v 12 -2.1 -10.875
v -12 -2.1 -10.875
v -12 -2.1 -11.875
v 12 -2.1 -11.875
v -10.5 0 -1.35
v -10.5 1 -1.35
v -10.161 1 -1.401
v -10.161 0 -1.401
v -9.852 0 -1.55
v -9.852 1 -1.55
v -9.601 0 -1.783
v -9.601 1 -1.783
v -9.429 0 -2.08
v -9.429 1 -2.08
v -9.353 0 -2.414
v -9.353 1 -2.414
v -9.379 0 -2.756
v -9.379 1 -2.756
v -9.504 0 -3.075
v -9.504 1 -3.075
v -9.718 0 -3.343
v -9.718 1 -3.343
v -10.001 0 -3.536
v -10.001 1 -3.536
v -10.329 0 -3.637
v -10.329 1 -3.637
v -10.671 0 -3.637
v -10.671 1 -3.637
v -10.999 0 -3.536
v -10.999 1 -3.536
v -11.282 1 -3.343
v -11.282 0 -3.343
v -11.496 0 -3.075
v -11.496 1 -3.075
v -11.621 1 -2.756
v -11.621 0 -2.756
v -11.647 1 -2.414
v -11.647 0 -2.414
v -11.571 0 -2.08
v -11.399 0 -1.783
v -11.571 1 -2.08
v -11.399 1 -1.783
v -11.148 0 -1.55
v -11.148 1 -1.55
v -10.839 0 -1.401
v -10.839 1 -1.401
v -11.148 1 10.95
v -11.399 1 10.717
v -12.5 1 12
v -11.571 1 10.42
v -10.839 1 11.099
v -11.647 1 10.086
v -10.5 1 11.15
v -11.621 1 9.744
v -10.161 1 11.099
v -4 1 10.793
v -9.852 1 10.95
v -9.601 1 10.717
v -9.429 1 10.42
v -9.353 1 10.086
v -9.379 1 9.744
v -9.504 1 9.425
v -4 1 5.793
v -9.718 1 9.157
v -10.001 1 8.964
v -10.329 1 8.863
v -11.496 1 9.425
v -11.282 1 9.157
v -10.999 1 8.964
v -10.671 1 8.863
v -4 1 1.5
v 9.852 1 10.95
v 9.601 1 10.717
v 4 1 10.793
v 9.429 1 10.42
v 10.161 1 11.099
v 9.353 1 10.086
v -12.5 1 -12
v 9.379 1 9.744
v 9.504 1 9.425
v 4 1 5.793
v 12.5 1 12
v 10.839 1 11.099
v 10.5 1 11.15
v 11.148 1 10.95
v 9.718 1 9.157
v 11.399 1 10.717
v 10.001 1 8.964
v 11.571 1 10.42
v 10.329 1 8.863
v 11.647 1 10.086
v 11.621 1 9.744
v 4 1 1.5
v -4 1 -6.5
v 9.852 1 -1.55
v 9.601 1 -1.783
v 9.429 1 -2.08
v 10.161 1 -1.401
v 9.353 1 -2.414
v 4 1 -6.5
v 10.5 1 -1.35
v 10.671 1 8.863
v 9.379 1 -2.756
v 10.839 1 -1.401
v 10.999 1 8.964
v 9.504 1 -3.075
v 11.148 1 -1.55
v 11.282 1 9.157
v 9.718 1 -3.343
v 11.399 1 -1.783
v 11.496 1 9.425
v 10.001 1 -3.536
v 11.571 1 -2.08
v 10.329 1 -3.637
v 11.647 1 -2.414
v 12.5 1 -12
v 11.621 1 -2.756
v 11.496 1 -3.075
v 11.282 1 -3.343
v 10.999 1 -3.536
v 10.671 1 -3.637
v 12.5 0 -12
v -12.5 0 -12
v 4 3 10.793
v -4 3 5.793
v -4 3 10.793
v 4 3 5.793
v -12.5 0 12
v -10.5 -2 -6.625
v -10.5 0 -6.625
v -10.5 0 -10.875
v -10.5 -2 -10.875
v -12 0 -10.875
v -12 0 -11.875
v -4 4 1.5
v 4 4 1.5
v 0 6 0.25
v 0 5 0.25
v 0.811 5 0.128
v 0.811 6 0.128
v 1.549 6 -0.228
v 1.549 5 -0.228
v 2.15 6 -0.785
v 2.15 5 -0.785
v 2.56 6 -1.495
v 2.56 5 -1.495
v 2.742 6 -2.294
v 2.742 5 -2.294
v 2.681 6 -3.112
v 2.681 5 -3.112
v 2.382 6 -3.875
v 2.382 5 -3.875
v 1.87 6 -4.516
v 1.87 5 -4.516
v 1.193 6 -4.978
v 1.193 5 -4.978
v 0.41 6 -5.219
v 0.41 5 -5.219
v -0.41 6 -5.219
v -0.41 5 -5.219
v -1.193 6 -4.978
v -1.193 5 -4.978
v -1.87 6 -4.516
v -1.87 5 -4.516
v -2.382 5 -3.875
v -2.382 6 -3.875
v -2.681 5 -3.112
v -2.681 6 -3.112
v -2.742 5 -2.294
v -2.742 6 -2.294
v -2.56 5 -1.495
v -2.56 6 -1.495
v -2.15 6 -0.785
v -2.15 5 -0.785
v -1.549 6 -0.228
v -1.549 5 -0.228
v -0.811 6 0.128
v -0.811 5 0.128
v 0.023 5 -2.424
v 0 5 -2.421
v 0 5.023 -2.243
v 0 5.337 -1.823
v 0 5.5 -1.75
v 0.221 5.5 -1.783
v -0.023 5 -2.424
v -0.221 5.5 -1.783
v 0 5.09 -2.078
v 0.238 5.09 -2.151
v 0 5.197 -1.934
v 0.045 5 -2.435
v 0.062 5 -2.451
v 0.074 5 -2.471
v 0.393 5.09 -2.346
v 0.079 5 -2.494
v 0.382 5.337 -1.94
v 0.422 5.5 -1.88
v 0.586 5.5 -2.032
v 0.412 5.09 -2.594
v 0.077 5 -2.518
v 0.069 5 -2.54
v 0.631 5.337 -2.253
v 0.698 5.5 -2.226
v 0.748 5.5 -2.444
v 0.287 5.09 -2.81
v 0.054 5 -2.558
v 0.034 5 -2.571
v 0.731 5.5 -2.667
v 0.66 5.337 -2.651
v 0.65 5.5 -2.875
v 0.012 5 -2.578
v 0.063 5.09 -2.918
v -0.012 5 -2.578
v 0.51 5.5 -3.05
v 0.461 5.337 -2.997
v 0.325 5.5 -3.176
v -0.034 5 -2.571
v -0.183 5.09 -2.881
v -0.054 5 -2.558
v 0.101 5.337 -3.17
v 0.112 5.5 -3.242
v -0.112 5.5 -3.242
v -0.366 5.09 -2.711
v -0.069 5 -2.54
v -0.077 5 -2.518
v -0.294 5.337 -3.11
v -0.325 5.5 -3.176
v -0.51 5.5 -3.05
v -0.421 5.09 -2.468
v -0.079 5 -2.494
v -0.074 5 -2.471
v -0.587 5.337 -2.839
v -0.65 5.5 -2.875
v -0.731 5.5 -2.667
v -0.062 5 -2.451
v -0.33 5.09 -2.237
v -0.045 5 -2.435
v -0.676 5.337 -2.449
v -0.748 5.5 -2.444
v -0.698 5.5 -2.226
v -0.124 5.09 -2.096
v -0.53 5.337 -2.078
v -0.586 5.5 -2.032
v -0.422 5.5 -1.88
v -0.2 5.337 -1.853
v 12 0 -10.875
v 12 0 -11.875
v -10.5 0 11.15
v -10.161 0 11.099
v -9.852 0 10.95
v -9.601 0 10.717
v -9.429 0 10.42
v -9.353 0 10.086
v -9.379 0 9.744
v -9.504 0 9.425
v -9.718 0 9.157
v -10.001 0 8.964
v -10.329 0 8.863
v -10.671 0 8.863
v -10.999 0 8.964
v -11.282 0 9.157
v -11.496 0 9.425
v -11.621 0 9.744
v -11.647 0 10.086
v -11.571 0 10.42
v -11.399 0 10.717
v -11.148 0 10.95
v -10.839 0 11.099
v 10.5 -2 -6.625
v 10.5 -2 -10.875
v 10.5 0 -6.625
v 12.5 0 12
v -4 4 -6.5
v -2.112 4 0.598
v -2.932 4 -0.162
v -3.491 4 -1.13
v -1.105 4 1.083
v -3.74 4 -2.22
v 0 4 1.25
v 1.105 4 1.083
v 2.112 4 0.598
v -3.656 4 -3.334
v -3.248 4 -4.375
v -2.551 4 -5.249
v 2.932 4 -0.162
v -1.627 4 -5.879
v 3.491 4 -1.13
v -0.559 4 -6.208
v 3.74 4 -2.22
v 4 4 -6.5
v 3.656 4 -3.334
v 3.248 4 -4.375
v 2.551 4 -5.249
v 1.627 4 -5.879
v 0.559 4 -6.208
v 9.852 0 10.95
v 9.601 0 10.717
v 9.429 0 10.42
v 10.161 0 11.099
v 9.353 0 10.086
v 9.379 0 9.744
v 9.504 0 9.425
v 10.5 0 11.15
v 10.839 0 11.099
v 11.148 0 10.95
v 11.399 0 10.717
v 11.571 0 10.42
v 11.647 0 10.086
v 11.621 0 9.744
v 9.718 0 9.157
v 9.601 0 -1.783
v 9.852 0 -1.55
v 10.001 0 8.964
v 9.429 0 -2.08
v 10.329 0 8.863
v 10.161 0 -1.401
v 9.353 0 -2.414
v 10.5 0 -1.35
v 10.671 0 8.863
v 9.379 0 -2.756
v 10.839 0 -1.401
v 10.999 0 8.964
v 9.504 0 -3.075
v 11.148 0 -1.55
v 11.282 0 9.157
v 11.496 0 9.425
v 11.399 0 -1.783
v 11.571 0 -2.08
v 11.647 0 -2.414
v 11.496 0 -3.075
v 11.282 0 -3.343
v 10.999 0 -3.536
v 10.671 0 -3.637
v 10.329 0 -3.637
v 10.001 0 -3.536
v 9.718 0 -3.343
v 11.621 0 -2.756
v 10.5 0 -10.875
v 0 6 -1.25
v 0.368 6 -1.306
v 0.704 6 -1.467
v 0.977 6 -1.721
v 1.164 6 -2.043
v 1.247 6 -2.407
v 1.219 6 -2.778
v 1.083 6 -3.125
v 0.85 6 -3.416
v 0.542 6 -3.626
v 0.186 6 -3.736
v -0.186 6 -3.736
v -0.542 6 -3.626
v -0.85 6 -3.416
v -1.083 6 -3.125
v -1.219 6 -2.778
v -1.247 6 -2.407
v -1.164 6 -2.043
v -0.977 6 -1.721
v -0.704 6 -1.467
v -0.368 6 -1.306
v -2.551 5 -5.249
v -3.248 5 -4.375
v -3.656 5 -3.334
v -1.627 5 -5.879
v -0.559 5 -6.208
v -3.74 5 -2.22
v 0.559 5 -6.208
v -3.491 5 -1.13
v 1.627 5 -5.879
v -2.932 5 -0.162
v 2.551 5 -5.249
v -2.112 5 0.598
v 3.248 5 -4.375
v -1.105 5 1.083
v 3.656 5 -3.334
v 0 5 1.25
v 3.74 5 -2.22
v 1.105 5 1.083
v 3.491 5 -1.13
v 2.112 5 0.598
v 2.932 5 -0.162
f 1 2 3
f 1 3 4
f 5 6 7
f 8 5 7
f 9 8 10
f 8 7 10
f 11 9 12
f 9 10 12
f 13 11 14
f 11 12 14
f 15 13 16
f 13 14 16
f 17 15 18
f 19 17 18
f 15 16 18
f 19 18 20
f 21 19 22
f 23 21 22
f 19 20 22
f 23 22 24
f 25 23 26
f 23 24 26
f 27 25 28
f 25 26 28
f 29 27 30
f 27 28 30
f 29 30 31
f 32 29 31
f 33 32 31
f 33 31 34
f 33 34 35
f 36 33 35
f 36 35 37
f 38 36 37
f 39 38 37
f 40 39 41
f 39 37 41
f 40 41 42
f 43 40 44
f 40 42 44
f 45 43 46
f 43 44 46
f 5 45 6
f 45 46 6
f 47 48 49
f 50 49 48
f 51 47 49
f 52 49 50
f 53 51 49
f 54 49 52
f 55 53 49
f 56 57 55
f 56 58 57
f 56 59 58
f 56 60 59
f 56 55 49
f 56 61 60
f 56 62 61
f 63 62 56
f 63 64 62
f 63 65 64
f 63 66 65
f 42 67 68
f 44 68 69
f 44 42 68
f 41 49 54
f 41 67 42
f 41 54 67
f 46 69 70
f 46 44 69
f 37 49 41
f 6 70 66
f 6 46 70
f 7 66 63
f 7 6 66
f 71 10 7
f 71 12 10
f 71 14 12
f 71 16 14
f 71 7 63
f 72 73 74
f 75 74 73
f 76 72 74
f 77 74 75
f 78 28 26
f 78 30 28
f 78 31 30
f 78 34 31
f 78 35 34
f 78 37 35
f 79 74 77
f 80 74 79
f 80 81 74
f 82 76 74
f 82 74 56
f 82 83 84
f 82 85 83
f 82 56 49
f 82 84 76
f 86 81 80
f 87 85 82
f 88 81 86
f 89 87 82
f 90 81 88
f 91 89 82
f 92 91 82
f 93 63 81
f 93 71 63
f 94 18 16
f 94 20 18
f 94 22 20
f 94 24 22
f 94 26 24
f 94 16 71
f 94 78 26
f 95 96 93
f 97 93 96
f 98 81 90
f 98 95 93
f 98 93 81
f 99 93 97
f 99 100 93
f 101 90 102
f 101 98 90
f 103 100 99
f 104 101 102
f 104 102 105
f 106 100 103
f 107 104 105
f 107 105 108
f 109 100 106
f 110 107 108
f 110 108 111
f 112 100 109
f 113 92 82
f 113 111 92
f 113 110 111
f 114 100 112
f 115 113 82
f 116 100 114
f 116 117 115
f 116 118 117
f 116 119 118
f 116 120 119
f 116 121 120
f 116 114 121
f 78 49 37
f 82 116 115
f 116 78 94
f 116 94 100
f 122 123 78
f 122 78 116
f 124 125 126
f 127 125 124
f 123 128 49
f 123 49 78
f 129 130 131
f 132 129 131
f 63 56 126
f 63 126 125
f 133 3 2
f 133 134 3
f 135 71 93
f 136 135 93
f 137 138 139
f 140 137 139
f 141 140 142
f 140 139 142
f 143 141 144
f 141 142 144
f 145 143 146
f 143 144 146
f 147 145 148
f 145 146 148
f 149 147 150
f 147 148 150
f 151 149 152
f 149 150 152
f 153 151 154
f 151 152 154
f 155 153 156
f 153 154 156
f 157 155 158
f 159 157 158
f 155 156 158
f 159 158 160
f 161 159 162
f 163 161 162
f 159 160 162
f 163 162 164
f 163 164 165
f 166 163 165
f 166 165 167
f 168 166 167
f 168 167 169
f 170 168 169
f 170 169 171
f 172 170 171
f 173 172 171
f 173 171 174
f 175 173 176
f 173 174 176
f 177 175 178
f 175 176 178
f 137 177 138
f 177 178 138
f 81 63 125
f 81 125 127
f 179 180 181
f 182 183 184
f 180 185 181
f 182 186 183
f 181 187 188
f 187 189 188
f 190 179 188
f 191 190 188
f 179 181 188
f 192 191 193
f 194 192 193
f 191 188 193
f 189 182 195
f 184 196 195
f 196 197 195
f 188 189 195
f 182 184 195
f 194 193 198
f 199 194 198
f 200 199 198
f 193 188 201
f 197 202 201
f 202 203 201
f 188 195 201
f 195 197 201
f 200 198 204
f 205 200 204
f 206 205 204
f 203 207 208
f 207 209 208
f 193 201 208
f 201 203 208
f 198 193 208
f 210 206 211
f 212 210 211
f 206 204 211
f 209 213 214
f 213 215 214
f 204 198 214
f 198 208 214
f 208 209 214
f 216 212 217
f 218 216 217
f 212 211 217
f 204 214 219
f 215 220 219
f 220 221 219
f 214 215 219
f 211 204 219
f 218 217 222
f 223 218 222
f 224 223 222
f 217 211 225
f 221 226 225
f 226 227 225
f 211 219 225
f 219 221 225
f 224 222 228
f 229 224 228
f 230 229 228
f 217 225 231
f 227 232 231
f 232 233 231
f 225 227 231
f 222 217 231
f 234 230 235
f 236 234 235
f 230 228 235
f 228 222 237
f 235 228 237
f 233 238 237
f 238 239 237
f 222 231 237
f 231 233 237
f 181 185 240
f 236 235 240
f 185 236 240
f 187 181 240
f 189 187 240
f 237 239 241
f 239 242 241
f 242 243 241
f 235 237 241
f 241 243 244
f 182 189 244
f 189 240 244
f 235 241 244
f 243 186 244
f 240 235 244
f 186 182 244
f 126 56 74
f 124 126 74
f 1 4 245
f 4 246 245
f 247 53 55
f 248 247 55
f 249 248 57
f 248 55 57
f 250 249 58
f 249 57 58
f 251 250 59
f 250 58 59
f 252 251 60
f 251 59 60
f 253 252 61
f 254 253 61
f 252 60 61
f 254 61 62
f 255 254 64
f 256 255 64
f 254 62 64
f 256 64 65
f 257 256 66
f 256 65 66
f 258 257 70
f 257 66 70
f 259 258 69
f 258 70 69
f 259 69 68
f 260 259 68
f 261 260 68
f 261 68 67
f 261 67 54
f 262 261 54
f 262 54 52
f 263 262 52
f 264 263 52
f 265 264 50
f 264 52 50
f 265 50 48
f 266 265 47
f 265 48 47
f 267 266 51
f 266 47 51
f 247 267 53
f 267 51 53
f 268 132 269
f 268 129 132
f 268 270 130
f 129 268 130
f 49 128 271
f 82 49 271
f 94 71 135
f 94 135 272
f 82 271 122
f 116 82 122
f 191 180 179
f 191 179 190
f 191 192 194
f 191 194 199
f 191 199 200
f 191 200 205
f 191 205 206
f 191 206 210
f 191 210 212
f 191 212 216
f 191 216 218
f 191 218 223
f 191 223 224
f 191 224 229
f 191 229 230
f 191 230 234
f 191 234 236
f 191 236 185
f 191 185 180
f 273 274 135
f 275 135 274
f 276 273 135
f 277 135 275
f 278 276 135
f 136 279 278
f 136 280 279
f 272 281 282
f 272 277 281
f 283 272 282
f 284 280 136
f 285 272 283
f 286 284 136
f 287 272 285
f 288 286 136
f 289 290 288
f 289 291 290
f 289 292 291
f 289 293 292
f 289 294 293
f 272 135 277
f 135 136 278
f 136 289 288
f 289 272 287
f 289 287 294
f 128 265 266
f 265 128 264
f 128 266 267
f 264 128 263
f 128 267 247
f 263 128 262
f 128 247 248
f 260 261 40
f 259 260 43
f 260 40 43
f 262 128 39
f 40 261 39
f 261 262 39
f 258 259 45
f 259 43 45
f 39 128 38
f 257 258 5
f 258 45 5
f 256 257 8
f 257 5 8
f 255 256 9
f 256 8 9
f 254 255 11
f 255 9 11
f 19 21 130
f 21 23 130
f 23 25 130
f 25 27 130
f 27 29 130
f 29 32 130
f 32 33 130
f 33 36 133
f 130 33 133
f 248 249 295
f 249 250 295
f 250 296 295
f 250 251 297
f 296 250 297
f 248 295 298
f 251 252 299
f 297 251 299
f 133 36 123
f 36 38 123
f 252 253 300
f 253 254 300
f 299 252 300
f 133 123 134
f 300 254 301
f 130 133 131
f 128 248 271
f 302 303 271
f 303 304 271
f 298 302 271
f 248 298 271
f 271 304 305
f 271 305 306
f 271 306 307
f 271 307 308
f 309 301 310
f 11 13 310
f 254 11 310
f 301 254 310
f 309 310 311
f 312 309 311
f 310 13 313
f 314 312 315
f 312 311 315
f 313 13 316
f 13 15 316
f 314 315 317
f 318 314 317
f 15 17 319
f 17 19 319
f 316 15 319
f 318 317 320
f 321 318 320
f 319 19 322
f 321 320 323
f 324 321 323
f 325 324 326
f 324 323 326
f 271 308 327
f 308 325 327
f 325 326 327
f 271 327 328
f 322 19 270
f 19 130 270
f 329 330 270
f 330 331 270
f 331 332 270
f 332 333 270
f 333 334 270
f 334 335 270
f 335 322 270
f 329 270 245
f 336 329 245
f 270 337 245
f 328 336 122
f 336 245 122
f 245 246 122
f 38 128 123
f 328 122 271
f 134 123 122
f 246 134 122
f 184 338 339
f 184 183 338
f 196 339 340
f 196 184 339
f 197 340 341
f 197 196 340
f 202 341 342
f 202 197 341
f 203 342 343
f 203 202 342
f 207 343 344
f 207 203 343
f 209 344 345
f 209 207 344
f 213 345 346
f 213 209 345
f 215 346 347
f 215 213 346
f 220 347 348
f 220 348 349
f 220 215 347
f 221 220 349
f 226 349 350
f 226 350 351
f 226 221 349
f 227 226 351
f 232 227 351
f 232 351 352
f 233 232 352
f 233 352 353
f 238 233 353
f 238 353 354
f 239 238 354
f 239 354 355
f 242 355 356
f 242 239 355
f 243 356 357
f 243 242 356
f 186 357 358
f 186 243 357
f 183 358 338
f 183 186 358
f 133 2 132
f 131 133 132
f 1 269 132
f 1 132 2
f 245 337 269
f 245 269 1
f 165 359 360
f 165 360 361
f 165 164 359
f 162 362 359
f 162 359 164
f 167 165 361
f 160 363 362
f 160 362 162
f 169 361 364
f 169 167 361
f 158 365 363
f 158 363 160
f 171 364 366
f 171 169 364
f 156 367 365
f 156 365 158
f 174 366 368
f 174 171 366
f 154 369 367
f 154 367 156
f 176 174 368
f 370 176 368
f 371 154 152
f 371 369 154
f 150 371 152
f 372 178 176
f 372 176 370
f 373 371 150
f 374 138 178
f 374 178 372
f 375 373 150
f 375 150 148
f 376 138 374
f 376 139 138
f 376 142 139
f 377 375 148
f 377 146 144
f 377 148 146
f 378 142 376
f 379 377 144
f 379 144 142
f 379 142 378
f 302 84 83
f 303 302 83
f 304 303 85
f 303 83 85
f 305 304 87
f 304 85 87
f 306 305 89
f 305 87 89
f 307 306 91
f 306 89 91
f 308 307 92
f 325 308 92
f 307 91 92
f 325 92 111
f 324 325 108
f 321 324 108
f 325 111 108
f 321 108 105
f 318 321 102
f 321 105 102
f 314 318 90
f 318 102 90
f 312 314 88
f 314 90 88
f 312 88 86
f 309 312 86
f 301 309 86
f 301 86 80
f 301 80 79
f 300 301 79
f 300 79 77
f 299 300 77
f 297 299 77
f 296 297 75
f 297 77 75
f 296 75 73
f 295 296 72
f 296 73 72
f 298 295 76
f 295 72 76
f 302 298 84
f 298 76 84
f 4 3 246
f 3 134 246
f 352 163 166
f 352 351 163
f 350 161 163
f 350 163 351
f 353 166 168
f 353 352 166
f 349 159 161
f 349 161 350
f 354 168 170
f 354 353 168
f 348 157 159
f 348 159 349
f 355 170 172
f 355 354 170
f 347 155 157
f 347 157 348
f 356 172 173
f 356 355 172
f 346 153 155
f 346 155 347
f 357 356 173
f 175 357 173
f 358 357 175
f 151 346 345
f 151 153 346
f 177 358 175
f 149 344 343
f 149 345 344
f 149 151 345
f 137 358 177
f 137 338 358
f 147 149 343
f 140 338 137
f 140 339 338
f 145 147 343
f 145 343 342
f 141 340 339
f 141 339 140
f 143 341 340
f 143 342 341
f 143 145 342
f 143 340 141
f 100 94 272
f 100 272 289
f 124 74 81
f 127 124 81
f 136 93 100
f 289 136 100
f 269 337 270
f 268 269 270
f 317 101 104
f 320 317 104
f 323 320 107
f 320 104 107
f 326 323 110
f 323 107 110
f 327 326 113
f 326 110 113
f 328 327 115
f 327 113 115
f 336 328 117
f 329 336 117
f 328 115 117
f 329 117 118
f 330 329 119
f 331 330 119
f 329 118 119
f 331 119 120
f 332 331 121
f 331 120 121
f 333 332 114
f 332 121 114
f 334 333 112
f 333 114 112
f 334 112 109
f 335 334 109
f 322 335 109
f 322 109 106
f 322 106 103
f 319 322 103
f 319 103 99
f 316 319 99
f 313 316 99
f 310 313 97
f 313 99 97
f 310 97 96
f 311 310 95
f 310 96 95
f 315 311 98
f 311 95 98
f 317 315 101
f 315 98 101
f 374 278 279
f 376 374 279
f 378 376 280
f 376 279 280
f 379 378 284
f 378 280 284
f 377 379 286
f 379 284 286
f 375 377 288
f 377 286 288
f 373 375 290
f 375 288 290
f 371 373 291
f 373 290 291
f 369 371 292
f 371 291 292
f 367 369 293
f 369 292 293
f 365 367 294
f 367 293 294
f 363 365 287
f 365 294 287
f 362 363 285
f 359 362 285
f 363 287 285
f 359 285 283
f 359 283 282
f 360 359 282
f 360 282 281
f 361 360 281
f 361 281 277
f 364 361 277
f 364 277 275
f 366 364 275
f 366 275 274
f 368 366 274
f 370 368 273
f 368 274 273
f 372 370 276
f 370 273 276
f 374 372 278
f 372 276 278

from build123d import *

# Parameters (mm, degrees)
SKETCH1_W           = 25
SKETCH1_H           = 24
BOSS_EXTRUDE1_DEPTH = 1
SKETCH2_R           = 1.15
CUT_EXTRUDE1_DEPTH  = 1
SKETCH3_W           = 8
SKETCH3_H           = 5
BOSS_EXTRUDE2_DEPTH = 2
SKETCH4_W           = 8
SKETCH4_H           = 8
BOSS_EXTRUDE3_DEPTH = 3
SKETCH5_R           = 3.75
BOSS_EXTRUDE4_DEPTH = 1
SKETCH6_R           = 2.75
BOSS_EXTRUDE5_DEPTH = 1
SKETCH7_R           = 0.75
CUT_EXTRUDE3_DEPTH  = 1
CHAMFER1_SIZE       = 0.5
FILLET2_R           = 0.7
BOSS_EXTRUDE6_DEPTH = 2
SKETCH9_W           = 24
SKETCH9_H           = 1
BOSS_EXTRUDE7_DEPTH = 0.1


with BuildPart() as part:
    # Sketch1 → Boss-Extrude1 (new body)
    with BuildSketch(Plane(origin=(0, 0, 0), x_dir=(1, 0, 0), z_dir=(0, 1, 0))):
        Rectangle(SKETCH1_W, SKETCH1_H)
    extrude(amount=BOSS_EXTRUDE1_DEPTH)

    # Sketch2 → Cut-Extrude1 (cut)
    with BuildSketch(Plane(origin=(0, 1, 0), x_dir=(1, 0, 0), z_dir=(0, 1, 0))):
        with Locations(Location((10.5, -10, 0), (0, 0, 270))):
            Circle(SKETCH2_R)
        with Locations(Location((-10.5, -10, 0), (0, 0, 270))):
            Circle(SKETCH2_R)
        with Locations(Location((-10.5, 2.5, 0), (0, 0, 270))):
            Circle(SKETCH2_R)
        with Locations(Location((10.5, 2.5, 0), (0, 0, 270))):
            Circle(SKETCH2_R)
    extrude(amount=-CUT_EXTRUDE1_DEPTH, mode=Mode.SUBTRACT)

    # Sketch3 → Boss-Extrude2 (add)
    with BuildSketch(Plane(origin=(0, 1, 0), x_dir=(1, 0, 0), z_dir=(0, 1, 0))):
        with Locations((0, -8.293334271)):
            Rectangle(SKETCH3_W, SKETCH3_H)
    extrude(amount=BOSS_EXTRUDE2_DEPTH)

    # Sketch4 → Boss-Extrude3 (add)
    with BuildSketch(Plane(origin=(0, 1, 0), x_dir=(1, 0, 0), z_dir=(0, 1, 0))):
        with Locations((0, 2.5)):
            Rectangle(SKETCH4_W, SKETCH4_H)
    extrude(amount=BOSS_EXTRUDE3_DEPTH)

    # Sketch5 → Boss-Extrude4 (add)
    with BuildSketch(Plane(origin=(0, 4, 0), x_dir=(1, 0, 0), z_dir=(0, 1, 0))):
        with Locations(Location((0, 2.5, 0), (0, 0, 270))):
            Circle(SKETCH5_R)
    extrude(amount=BOSS_EXTRUDE4_DEPTH)

    # Sketch6 → Boss-Extrude5 (add)
    with BuildSketch(Plane(origin=(0, 5, 0), x_dir=(1, 0, 0), z_dir=(0, 1, 0))):
        with Locations(Location((0, 2.5, 0), (0, 0, 270))):
            Circle(SKETCH6_R)
    extrude(amount=BOSS_EXTRUDE5_DEPTH)

    # Sketch7 → Cut-Extrude3 (cut)
    with BuildSketch(Plane(origin=(0, 6, 0), x_dir=(1, 0, 0), z_dir=(0, 1, 0))):
        with Locations(Location((0, 2.5, 0), (0, 0, 270))):
            Circle(SKETCH7_R)
    extrude(amount=-CUT_EXTRUDE3_DEPTH, mode=Mode.SUBTRACT)

    # Chamfer1
    chamfer1_edges = [part.edges().sort_by_distance(p)[0] for p in [
        (0, 6, -3.25),
    ]]
    chamfer(chamfer1_edges, length=CHAMFER1_SIZE)

    # Fillet2
    # the kernel refuses this fillet: 0.7 mm, written as the material it adds along each edge
    with BuildSketch(Plane(origin=(0, 5, -2.5), x_dir=(0, 0, 1), z_dir=(-1, 0, 0))) as fillet2_piece_1:
        with BuildLine():
            CenterArc((0.079179607, 0.7), FILLET2_R, 270, 73.398450401)
            Line((0.079179607, 0), (0.079179607, -0.014))
            Line((0.079179607, -0.014), (0.75, -0.014))
            Line((0.75, -0.014), (0.764, 0))
            ThreePointArc((0.764, 0), (0.764, 0.25), (0.763416408, 0.496))
            Line((0.763416408, 0.496), (0.75, 0.5))
        make_face()
    revolve(axis=Axis((0, 5, -2.5), (0, 1, 0)))

    # Sketch8 → Boss-Extrude6 (add)
    with BuildSketch(Plane.XZ):
        Polygon((10.5, -11.875), (12, -11.875), (12, -10.875), (10.5, -10.875), (10.5, -6.625), (-10.5, -6.625), (-10.5, -10.875), (-12, -10.875), (-12, -11.875), (-10.5, -11.875), align=None)
    extrude(amount=BOSS_EXTRUDE6_DEPTH)

    # Sketch9 → Boss-Extrude7 (add)
    with BuildSketch(Plane.XZ.offset(2)):
        with Locations((0, -11.375)):
            Rectangle(SKETCH9_W, SKETCH9_H)
    extrude(amount=BOSS_EXTRUDE7_DEPTH)


solid = part.part
